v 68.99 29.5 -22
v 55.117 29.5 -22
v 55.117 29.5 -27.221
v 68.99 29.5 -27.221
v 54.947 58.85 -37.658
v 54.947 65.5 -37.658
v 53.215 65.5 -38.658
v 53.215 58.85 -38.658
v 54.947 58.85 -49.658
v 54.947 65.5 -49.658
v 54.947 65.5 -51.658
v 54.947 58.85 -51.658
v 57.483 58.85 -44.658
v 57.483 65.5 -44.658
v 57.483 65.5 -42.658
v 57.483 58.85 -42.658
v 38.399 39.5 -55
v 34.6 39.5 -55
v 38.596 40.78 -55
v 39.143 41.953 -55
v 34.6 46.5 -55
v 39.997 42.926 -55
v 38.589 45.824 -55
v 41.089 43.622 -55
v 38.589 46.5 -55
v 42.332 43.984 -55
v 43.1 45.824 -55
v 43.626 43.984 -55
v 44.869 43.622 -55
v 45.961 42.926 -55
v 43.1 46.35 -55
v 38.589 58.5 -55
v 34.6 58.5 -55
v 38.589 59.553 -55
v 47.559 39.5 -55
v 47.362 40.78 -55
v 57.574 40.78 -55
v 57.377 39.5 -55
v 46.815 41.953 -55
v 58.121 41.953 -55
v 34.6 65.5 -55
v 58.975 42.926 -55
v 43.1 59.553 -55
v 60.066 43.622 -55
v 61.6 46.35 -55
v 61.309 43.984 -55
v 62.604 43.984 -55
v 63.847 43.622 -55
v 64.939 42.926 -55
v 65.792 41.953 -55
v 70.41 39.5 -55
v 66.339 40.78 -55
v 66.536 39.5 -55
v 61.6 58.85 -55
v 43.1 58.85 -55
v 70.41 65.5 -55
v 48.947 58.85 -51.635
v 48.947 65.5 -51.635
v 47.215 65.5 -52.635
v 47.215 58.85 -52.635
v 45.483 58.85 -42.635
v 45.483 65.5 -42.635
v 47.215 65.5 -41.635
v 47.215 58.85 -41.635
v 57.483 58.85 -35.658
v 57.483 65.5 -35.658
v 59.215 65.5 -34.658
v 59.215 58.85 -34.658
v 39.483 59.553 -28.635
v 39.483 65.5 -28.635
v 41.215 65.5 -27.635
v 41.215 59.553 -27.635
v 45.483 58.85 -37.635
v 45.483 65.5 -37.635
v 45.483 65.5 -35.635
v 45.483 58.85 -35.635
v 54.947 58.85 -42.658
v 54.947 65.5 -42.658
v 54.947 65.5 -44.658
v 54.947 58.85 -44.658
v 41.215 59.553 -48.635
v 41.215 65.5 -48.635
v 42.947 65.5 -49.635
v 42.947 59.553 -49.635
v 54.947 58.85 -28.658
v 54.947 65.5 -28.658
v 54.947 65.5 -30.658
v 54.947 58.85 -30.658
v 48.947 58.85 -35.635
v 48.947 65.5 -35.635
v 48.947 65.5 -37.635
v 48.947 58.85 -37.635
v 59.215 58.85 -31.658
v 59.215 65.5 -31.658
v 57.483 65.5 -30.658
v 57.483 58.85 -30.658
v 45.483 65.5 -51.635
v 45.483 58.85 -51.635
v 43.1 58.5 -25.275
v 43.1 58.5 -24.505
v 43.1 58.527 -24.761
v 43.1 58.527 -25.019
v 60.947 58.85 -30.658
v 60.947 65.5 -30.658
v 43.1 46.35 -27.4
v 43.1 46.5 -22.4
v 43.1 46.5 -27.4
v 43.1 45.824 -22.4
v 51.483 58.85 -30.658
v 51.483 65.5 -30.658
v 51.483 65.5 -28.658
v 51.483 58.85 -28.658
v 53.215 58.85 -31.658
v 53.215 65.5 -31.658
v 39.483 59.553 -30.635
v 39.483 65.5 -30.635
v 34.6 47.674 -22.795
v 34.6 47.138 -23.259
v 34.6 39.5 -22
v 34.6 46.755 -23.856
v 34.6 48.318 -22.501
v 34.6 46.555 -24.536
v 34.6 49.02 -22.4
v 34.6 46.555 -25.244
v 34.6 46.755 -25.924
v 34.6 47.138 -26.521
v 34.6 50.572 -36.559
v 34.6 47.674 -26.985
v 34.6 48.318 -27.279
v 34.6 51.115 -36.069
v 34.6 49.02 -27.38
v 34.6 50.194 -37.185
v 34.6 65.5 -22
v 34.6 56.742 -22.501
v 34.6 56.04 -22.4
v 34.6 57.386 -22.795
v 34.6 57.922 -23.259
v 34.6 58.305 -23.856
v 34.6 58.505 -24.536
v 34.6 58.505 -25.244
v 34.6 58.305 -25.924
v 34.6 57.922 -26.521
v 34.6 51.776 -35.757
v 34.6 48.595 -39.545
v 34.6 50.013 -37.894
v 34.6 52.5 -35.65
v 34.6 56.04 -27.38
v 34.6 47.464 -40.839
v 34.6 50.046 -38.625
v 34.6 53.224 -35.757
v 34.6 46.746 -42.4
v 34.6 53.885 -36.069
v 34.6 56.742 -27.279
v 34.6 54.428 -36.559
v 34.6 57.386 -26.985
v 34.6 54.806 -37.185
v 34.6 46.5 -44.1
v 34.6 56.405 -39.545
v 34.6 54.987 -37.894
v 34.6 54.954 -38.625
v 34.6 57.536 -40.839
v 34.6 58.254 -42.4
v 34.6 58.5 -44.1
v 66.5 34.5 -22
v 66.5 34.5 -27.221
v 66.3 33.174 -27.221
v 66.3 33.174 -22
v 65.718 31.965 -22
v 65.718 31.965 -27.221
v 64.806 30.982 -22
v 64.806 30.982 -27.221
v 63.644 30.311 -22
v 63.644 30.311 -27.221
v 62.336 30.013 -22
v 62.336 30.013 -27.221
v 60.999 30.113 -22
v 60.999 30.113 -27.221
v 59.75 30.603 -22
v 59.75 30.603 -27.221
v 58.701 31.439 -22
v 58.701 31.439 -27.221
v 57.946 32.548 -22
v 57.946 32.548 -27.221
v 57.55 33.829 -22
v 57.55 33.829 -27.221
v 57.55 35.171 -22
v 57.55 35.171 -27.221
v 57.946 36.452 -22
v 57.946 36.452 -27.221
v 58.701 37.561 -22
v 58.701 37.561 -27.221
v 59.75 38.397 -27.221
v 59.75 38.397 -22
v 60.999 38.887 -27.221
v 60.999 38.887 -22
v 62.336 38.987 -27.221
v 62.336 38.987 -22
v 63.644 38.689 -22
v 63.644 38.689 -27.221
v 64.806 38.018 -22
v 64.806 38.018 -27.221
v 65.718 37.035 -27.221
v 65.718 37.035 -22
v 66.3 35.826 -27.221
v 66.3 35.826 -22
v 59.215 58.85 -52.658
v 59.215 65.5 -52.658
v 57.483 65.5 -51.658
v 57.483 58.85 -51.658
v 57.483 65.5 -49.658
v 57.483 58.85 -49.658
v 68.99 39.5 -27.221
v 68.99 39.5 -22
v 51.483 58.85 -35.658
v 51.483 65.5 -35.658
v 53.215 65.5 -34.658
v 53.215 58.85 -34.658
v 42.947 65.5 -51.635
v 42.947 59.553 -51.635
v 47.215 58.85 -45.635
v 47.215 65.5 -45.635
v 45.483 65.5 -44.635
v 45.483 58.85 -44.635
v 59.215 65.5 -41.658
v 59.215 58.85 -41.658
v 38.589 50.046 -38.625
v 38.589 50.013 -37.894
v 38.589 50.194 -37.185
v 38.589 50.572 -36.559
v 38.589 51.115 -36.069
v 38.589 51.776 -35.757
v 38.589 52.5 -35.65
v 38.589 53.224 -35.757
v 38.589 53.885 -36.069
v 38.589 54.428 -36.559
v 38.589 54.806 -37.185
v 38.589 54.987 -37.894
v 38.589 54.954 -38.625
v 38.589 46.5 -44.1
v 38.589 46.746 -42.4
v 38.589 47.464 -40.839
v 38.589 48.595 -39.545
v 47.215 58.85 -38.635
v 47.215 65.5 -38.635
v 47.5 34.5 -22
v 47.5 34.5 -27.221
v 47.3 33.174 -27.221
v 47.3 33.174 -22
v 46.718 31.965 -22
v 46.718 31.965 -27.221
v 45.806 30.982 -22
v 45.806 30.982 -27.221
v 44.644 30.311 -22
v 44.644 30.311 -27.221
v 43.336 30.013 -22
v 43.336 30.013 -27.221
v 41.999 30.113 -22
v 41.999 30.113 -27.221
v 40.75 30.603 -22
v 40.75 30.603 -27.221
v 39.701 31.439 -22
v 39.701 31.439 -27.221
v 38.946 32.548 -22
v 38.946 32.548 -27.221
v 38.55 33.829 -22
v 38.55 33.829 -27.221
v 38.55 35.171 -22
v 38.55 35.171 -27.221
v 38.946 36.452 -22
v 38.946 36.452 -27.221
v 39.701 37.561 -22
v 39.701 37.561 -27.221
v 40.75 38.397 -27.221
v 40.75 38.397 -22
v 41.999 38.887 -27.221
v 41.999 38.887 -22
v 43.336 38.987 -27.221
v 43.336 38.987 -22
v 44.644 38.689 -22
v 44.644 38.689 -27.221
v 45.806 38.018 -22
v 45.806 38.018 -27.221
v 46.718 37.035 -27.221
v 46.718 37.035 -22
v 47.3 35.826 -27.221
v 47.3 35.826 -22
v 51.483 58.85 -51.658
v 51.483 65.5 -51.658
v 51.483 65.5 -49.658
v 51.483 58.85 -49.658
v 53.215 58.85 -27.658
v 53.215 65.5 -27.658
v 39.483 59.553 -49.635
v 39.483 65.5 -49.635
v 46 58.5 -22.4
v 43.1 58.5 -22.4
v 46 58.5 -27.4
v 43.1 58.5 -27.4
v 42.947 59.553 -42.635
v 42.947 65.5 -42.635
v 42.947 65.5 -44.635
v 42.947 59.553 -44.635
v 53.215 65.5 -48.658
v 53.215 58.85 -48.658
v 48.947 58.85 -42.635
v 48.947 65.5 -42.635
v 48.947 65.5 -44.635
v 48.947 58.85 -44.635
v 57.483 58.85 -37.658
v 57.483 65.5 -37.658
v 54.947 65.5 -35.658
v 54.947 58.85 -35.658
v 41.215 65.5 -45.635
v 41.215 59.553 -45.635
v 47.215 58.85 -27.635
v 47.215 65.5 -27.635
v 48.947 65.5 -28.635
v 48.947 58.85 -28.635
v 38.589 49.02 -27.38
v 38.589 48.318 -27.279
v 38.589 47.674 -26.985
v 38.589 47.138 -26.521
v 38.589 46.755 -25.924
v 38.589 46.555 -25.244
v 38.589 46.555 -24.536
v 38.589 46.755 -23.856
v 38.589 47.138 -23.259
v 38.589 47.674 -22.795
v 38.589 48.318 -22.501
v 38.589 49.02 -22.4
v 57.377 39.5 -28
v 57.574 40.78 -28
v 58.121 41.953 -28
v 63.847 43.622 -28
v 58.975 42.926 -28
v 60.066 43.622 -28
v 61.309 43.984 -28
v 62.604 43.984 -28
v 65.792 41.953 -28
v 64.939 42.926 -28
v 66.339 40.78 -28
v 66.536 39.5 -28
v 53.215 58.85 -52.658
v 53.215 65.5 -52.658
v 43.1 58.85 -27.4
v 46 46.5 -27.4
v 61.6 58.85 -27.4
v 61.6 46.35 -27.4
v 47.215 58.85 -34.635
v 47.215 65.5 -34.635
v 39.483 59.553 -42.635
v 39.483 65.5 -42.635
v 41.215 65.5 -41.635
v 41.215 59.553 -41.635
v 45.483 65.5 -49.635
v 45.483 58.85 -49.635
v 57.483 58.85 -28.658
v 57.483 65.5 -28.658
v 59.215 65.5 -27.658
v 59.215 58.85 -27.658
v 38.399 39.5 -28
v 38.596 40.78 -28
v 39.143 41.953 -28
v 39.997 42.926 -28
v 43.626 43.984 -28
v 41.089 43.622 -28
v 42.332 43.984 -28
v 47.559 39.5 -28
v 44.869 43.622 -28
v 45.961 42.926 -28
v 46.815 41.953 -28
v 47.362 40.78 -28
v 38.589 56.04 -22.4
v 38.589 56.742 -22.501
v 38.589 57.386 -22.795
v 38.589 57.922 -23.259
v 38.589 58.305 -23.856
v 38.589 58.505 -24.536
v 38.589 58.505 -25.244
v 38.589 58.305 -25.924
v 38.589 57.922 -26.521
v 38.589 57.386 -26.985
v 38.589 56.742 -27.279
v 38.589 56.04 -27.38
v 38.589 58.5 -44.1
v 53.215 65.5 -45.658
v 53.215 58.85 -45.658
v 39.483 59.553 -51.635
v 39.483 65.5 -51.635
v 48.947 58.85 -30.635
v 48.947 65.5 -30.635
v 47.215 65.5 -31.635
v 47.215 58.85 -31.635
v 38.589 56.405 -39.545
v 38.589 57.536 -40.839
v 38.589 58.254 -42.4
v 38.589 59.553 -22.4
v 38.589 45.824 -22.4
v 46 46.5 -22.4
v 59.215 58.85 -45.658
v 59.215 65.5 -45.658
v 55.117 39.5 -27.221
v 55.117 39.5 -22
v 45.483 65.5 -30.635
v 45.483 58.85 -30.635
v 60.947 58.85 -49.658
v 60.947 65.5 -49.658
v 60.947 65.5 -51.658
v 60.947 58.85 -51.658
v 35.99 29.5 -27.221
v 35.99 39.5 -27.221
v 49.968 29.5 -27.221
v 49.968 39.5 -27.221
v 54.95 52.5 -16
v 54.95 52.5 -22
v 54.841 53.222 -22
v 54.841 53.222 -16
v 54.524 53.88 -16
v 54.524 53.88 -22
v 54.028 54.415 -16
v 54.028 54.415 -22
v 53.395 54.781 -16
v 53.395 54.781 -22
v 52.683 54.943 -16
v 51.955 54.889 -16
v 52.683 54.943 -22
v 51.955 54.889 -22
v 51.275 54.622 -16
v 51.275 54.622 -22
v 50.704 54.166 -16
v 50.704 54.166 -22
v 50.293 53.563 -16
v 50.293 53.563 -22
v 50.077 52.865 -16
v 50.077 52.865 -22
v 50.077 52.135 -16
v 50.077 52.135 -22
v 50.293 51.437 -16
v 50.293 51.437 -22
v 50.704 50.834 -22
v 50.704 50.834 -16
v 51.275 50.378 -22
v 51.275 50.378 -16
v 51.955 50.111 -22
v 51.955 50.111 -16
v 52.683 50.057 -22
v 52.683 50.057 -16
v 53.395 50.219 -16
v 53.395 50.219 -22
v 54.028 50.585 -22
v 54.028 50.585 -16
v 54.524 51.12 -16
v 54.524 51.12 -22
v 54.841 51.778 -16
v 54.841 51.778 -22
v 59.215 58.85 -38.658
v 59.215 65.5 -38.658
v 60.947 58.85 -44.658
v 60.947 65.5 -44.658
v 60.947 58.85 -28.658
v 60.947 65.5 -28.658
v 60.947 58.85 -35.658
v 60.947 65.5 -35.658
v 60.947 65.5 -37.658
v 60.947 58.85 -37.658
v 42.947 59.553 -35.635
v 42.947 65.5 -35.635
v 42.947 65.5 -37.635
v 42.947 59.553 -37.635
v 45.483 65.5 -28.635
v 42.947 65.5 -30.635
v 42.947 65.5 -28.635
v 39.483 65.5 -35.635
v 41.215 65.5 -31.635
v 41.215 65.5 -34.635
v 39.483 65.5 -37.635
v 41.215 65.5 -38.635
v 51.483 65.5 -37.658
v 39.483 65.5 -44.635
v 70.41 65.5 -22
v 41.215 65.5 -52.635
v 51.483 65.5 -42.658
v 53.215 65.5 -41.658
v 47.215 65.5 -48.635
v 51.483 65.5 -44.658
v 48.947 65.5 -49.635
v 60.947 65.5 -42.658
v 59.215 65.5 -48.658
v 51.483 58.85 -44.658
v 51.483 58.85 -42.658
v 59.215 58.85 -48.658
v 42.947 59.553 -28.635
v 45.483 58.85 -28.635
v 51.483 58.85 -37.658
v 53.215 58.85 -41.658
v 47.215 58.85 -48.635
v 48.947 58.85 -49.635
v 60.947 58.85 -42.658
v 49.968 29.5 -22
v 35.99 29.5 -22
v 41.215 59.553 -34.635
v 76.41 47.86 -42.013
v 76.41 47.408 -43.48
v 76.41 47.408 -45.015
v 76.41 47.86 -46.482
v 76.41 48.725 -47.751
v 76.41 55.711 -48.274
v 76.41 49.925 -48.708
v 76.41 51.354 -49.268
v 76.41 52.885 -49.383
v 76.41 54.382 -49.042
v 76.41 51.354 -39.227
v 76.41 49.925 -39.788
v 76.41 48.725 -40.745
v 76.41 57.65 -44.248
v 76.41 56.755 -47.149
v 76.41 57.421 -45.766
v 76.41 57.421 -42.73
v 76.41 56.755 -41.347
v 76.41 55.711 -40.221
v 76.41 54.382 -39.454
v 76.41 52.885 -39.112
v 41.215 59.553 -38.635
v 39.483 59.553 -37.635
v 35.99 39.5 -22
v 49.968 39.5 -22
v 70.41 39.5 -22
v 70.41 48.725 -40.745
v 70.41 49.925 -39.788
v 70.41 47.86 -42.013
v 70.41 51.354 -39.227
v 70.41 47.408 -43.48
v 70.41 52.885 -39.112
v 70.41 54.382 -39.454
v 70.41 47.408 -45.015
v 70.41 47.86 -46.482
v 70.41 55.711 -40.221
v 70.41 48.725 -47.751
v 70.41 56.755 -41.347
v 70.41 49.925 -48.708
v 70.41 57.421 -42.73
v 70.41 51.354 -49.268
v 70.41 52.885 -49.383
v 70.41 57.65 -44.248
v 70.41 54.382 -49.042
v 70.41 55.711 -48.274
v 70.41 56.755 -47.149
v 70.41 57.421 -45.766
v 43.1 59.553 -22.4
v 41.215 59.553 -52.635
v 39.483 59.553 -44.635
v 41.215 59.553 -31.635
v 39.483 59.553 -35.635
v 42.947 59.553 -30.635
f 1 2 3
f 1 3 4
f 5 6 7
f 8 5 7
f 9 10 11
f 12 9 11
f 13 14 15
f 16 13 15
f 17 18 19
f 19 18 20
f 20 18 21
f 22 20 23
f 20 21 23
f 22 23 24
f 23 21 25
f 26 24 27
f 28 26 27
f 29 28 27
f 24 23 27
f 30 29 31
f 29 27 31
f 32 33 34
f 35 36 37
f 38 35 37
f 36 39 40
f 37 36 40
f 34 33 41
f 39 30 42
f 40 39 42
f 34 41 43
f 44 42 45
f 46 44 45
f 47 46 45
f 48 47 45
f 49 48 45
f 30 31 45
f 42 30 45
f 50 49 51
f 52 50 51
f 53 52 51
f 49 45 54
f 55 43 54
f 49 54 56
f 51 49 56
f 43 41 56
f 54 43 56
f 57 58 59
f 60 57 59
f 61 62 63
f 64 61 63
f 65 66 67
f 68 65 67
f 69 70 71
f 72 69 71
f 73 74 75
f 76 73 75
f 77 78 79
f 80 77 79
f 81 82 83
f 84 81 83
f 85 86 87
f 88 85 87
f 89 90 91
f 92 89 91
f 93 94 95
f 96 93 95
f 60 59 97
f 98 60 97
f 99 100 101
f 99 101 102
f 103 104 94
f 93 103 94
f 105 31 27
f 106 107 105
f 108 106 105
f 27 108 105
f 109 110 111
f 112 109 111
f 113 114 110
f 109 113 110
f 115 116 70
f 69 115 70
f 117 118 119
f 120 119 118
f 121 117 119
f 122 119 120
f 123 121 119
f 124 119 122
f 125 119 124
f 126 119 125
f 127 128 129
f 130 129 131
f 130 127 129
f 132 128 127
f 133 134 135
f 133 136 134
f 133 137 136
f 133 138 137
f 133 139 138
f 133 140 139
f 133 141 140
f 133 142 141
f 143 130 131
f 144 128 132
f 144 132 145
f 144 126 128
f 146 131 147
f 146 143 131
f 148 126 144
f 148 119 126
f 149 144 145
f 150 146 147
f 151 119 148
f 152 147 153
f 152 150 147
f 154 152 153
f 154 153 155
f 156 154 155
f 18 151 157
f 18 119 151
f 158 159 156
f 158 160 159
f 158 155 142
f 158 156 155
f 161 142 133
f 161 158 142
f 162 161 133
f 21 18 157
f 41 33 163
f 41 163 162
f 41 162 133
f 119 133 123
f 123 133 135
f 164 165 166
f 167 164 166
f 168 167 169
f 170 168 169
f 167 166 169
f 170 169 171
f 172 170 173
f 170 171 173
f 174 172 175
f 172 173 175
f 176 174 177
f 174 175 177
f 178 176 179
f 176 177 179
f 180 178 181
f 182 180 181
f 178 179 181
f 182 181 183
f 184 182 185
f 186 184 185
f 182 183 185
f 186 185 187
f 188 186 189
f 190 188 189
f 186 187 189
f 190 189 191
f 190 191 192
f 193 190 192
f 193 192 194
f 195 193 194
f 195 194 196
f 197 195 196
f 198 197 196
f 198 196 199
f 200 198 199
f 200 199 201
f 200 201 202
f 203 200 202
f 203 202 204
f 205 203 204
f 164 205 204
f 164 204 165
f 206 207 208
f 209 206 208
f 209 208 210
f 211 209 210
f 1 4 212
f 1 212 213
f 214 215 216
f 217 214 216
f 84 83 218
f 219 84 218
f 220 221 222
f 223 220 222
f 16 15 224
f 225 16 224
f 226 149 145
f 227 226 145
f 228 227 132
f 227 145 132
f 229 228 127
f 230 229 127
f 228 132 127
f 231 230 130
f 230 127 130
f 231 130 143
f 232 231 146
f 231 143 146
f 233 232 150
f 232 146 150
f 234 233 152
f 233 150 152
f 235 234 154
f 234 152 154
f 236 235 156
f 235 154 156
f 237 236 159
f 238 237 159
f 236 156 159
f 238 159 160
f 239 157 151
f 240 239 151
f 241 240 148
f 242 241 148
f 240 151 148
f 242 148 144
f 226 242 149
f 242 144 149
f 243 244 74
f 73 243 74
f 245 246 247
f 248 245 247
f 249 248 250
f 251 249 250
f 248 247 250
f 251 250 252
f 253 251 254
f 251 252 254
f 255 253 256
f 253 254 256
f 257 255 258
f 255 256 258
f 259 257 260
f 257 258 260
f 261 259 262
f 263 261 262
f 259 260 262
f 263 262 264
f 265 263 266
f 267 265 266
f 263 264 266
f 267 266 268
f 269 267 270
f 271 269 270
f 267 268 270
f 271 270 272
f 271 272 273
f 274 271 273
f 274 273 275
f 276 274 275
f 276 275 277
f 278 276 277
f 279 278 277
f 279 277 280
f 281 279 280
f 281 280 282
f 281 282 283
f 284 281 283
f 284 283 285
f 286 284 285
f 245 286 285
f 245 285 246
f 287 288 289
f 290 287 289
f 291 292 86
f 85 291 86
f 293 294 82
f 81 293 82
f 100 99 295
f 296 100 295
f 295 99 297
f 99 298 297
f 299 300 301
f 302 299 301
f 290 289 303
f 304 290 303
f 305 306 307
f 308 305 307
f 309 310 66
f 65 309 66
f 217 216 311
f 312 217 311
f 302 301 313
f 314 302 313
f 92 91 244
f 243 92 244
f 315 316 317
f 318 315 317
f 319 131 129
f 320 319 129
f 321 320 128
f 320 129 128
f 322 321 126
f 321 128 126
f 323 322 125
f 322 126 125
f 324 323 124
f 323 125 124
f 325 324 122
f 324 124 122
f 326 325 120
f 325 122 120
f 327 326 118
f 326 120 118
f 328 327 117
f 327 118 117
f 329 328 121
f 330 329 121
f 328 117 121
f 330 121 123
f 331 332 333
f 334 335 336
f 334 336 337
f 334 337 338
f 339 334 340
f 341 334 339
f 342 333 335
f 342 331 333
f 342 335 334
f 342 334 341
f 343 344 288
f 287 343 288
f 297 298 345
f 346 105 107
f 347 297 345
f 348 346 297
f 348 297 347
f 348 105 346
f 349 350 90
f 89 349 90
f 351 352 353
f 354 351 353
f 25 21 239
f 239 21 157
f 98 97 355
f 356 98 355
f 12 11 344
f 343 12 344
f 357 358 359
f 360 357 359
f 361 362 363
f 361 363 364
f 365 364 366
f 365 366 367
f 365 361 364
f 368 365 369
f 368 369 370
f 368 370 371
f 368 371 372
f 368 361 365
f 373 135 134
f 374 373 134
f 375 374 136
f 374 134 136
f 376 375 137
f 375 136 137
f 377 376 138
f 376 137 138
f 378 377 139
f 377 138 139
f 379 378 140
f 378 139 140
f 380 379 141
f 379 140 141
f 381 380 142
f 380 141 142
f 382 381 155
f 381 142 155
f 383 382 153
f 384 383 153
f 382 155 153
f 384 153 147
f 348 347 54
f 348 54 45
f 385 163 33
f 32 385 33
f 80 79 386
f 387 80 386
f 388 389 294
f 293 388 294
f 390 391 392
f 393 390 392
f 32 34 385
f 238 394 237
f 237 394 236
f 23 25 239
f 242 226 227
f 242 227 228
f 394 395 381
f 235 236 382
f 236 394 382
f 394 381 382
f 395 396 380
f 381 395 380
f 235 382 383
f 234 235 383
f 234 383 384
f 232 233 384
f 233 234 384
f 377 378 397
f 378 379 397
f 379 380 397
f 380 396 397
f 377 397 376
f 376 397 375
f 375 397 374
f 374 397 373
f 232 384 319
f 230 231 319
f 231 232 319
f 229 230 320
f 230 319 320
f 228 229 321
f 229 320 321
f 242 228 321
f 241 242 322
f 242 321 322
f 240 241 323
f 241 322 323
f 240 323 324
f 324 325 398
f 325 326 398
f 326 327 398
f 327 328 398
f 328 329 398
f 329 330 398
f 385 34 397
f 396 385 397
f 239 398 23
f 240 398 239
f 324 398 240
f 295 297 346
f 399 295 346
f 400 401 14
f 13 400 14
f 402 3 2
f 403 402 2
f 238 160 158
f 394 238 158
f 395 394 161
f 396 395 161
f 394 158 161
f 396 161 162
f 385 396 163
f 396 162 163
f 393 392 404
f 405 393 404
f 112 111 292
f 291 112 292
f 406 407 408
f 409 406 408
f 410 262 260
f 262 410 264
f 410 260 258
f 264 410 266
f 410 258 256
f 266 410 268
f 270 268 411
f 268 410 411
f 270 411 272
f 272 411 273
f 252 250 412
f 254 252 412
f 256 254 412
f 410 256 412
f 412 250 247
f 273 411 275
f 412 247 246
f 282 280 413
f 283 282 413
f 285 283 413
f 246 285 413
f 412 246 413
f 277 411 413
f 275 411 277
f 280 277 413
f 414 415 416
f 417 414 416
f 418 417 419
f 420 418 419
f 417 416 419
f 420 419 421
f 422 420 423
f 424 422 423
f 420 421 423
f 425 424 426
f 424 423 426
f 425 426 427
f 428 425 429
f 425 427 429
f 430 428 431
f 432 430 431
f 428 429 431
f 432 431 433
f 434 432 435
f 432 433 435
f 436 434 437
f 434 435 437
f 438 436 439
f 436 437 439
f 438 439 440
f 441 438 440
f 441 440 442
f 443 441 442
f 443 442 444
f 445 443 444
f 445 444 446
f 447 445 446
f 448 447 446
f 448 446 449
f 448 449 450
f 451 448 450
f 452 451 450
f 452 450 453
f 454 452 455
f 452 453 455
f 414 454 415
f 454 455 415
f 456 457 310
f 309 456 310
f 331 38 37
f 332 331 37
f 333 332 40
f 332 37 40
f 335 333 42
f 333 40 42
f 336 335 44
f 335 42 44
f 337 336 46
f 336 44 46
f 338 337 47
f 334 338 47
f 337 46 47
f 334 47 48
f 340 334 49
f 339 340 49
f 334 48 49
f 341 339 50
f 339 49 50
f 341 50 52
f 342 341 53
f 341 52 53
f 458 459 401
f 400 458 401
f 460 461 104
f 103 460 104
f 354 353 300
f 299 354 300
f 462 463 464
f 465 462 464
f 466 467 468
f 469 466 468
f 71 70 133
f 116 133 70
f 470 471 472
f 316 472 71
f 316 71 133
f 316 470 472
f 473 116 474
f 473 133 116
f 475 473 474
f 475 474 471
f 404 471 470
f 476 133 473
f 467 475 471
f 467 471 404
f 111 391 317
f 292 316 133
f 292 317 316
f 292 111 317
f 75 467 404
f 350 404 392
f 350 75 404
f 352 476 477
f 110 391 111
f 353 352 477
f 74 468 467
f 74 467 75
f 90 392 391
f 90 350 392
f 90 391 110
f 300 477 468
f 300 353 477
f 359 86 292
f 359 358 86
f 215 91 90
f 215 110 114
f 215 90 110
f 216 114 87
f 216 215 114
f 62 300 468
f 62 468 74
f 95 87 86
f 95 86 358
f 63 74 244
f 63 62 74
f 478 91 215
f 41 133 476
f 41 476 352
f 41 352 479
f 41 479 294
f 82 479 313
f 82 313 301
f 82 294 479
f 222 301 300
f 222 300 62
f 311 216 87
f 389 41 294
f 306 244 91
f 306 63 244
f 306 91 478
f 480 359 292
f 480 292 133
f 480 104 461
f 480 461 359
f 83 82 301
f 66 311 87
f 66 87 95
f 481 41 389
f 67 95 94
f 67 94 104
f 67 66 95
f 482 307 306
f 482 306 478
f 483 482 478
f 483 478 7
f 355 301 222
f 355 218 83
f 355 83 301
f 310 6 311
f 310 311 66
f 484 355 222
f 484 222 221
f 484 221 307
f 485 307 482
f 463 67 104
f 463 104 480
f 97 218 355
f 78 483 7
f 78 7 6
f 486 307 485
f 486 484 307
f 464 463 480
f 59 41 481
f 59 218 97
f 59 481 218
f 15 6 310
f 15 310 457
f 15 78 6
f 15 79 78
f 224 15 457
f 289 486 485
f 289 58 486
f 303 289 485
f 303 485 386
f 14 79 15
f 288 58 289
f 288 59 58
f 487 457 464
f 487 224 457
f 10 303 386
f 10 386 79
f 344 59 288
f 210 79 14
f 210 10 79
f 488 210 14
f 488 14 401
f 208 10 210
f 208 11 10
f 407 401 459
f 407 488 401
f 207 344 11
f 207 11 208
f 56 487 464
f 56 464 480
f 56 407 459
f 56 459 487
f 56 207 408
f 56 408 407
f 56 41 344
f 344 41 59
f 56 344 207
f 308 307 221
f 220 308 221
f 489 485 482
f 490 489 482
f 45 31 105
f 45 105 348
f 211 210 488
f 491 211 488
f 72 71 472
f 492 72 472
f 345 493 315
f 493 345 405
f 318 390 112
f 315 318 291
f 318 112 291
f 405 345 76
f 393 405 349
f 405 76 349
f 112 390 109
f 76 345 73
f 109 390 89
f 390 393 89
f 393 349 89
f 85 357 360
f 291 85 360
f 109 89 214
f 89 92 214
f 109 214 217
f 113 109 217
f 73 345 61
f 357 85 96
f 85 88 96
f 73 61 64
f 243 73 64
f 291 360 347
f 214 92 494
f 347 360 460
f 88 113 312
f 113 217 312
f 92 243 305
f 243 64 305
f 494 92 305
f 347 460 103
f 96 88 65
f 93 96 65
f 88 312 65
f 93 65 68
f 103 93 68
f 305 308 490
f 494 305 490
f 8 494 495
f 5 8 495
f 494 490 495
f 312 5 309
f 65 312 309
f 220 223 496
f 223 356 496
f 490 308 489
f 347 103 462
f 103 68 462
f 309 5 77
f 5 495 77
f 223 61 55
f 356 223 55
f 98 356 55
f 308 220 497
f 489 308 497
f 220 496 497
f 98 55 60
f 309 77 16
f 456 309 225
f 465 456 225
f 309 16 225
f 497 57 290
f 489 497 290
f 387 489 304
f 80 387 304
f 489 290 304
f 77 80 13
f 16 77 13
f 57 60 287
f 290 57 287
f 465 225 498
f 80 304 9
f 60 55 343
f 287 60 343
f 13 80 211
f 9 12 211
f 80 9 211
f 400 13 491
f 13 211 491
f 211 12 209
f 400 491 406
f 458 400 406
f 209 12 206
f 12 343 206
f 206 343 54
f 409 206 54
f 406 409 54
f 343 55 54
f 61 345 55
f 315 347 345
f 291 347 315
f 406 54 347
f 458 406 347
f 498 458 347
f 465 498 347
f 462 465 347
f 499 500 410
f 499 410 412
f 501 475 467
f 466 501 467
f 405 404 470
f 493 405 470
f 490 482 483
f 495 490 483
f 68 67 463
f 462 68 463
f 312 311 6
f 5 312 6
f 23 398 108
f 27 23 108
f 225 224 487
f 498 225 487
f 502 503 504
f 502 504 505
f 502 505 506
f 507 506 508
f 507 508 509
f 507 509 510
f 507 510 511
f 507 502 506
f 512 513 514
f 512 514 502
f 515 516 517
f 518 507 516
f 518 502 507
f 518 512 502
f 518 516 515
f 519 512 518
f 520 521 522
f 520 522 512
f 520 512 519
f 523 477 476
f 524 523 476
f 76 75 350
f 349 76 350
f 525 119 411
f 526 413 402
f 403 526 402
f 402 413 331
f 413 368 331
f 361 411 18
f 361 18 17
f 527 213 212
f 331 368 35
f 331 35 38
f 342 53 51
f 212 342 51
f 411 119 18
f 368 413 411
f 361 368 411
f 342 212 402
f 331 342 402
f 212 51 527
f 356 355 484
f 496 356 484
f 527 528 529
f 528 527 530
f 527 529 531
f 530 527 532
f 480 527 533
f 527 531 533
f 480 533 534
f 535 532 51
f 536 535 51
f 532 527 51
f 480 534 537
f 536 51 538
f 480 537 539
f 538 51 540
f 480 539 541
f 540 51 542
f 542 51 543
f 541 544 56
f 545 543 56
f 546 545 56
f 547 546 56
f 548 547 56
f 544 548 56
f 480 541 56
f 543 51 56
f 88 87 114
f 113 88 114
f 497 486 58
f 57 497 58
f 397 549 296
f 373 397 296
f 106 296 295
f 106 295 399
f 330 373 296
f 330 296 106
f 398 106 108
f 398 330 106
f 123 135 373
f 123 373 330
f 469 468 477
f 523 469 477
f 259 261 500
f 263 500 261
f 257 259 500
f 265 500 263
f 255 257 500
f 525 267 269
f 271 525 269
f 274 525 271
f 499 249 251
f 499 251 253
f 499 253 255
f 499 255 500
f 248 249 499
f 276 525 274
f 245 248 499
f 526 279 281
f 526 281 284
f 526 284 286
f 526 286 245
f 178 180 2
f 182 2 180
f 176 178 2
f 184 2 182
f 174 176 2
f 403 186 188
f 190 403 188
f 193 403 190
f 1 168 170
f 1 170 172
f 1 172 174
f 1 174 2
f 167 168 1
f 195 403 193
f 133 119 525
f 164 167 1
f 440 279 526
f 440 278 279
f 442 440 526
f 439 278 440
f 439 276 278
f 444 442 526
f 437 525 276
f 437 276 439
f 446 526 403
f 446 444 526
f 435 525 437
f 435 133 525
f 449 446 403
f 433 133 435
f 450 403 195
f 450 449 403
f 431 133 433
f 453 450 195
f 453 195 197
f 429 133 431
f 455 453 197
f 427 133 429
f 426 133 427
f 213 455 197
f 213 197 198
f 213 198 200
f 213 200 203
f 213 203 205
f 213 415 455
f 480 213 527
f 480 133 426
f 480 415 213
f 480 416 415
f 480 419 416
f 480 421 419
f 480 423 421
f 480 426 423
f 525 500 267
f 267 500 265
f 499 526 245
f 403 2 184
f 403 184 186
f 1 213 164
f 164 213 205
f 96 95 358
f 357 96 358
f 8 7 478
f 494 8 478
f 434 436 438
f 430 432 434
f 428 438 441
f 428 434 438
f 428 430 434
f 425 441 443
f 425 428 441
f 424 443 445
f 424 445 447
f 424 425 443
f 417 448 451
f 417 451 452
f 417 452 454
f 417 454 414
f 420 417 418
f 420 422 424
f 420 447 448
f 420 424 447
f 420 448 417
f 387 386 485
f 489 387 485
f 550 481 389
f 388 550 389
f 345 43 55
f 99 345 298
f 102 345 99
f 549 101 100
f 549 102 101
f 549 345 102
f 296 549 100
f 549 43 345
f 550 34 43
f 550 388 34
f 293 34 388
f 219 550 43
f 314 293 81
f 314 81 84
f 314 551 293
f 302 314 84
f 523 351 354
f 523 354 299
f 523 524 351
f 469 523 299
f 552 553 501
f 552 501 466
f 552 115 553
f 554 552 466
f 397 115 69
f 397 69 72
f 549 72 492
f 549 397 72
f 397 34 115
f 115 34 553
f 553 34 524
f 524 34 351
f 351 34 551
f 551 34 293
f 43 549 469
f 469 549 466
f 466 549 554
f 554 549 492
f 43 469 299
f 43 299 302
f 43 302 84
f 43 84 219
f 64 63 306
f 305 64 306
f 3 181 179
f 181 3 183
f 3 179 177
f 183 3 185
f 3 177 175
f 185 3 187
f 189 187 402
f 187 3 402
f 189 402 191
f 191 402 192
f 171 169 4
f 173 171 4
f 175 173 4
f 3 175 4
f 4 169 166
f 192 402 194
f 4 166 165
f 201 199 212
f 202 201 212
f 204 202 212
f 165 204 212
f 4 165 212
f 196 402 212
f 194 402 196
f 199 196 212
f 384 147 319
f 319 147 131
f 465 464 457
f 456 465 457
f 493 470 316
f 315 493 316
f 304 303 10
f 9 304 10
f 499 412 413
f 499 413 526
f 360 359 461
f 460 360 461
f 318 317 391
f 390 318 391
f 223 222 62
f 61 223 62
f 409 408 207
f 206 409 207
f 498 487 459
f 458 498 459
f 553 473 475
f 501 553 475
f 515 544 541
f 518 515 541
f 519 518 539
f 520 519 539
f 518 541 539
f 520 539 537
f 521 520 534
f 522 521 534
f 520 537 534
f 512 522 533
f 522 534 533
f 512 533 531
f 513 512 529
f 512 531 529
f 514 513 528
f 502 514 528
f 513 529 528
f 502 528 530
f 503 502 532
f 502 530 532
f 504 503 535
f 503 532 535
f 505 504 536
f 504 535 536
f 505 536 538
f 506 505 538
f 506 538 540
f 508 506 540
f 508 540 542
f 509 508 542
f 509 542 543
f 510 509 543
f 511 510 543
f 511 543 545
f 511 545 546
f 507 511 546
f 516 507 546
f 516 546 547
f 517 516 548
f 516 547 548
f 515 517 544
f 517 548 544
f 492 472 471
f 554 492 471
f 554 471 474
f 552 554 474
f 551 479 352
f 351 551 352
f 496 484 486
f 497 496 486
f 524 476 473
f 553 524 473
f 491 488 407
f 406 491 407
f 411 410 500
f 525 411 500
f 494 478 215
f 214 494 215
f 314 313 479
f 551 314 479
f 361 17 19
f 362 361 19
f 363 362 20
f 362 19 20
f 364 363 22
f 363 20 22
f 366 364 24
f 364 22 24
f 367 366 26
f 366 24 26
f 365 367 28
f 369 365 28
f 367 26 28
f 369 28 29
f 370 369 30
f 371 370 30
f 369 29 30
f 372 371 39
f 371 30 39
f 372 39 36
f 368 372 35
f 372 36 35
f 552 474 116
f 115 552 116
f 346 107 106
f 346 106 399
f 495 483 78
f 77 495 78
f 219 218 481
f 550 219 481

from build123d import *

# Parameters (mm, degrees)
SKETCH007_W          = 35.81
SKETCH007_H          = 26
PAD002_DEPTH         = 33
SKETCH008_R          = 2.45
PAD003_DEPTH         = 6
SKETCH009_W          = 13.978334
SKETCH009_H          = 5.221016
SKETCH009_W_2        = 13.87282
PAD004_DEPTH         = 10
SKETCH010_R          = 4.5
POCKET_DEPTH         = 11.222016
SKETCH016_W          = 22.6
SKETCH016_H          = 12.5
POCKET004_DEPTH      = 27.6
POCKET005_DEPTH      = 5.4
SKETCH018_W          = 4.8
SKETCH018_H          = 12
POCKET006_DEPTH      = 5
POCKET007_DEPTH      = 8.5
POCKET008_DEPTH      = 200
POCKET008_DEPTH_BACK = 200
POCKET036_DEPTH      = 5
SKETCH099_R          = 5.15
PAD045_DEPTH         = 6
SKETCH100_W          = 4.510635
SKETCH100_H          = 13.729386
POCKET046_DEPTH      = 34
POCKET047_DEPTH      = 9
POCKET048_DEPTH      = 27


with BuildPart() as part:
    # Sketch007 → Pad002 (new body)
    with BuildSketch(Plane.XY):
        with Locations((52.505, 52.5)):
            Rectangle(SKETCH007_W, SKETCH007_H)
    extrude(amount=PAD002_DEPTH)

    # Sketch008 (on Face6 of Pad002) → Pad003 (join)
    with BuildSketch(Plane.XY.offset(33)):
        with Locations((52.5, 52.5)):
            Circle(SKETCH008_R)
    extrude(amount=PAD003_DEPTH)

    # Sketch009 (on Face1 of Pad003) → Pad004 (join)
    with BuildSketch(Plane.XZ.offset(-39.5)):
        with Locations((42.979167, 30.389492)):
            Rectangle(SKETCH009_W, SKETCH009_H)
        with Locations((62.05359, 30.389492)):
            Rectangle(SKETCH009_W_2, SKETCH009_H)
    extrude(amount=PAD004_DEPTH)

    # Sketch010 (on Face6 of Pad004) → Pocket (cut, through all)
    with BuildSketch(Plane(origin=(0, 0, 27.778984), x_dir=(1, 0, 0), z_dir=(0, 0, -1))):
        with Locations((62, -34.5)):
            Circle(SKETCH010_R)
        with Locations((43, -34.5)):
            Circle(SKETCH010_R)
    extrude(amount=-POCKET_DEPTH, mode=Mode.SUBTRACT)

    # Sketch016 → Pocket004 (cut)
    with BuildSketch(Plane(origin=(0, 0, 0), x_dir=(1, 0, 0), z_dir=(0, 0, -1))):
        with Locations((50.3, -52.6)):
            Rectangle(SKETCH016_W, SKETCH016_H)
    extrude(amount=-POCKET004_DEPTH, mode=Mode.SUBTRACT)

    # Sketch015 (on Face3 of Pocket) → Pocket005 (cut)
    with BuildSketch(Plane(origin=(34.6, 0, 0), x_dir=(0, -1, 0), z_dir=(-1, 0, 0))):
        with BuildLine():
            Line((-58.5, 0), (-46.5, 0))
            Line((-46.5, 0), (-46.5, 10.9))
            ThreePointArc((-46.5, 10.9), (-47.4637930268, 14.1613830383), (-50.0455397742, 16.375))
            ThreePointArc((-50.0455397742, 16.375), (-52.5, 19.35), (-54.9544602258, 16.375))
            ThreePointArc((-54.9544602258, 16.375), (-57.5362069732, 14.1613830383), (-58.5, 10.9))
            Line((-58.5, 10.9), (-58.5, 0))
        make_face()
    extrude(amount=-POCKET005_DEPTH, mode=Mode.SUBTRACT)

    # Sketch018 → Pocket006 (cut)
    with BuildSketch(Plane(origin=(0, 0, 27.6), x_dir=(1, 0, 0), z_dir=(0, 0, -1))):
        with Locations((43.6, -52.5)):
            Rectangle(SKETCH018_W, SKETCH018_H)
    extrude(amount=-POCKET006_DEPTH, mode=Mode.SUBTRACT)

    # Sketch020 (on Face3 of Pocket006) → Pocket007 (cut)
    with BuildSketch(Plane(origin=(34.6, 0, 0), x_dir=(0, -1, 0), z_dir=(-1, 0, 0))):
        with BuildLine():
            ThreePointArc((-56.04, 32.6), (-58.53, 30.11), (-56.04, 27.62))
            Line((-56.04, 27.62), (-49.02, 27.62))
            ThreePointArc((-49.02, 27.62), (-46.53, 30.11), (-49.02, 32.6))
            Line((-56.04, 32.6), (-49.02, 32.6))
        make_face()
    extrude(amount=-POCKET007_DEPTH, mode=Mode.SUBTRACT)

    # Sketch021 (on Face9 of Pocket007) → Pocket008 (cut, two sides)
    with BuildSketch(Plane(origin=(0, 0, 27.778984), x_dir=(1, 0, 0), z_dir=(0, 0, -1))) as pocket008_sk:
        Polygon((-57.6610266203, 24.8205080757), (-59.6610266203, 25.9752086141), (-61.6610266203, 24.8205080757), (-61.6610266203, 22.5111069989), (-59.6610266203, 21.3564064606), (-57.6610266203, 22.5111069989), align=None)
        Polygon((-57.6610266203, 18.2017059222), (-59.6610266203, 19.3564064606), (-61.6610266203, 18.2017059222), (-61.6610266203, 15.8923048454), (-59.6610266203, 14.737604307), (-57.6610266203, 15.8923048454), align=None)
        Polygon((-57.6610266203, 11.5829037687), (-59.6610266203, 12.737604307), (-61.6610266203, 11.5829037687), (-61.6610266203, 9.2735026919), (-59.6610266203, 8.1188021535), (-57.6610266203, 9.2735026919), align=None)
        Polygon((-57.6610266203, 4.9641016151), (-59.6610266203, 6.1188021535), (-61.6610266203, 4.9641016151), (-61.6610266203, 2.6547005384), (-59.6610266203, 1.5), (-57.6610266203, 2.6547005384), align=None)
        Polygon((-45.6610266203, 24.8205080757), (-47.6610266203, 25.9752086141), (-49.6610266203, 24.8205080757), (-49.6610266203, 22.5111069989), (-47.6610266203, 21.3564064606), (-45.6610266203, 22.5111069989), align=None)
        Polygon((-45.6610266203, 18.2017059222), (-47.6610266203, 19.3564064606), (-49.6610266203, 18.2017059222), (-49.6610266203, 15.8923048454), (-47.6610266203, 14.737604307), (-45.6610266203, 15.8923048454), align=None)
        Polygon((-45.6610266203, 11.5829037687), (-47.6610266203, 12.737604307), (-49.6610266203, 11.5829037687), (-49.6610266203, 9.2735026919), (-47.6610266203, 8.1188021535), (-45.6610266203, 9.2735026919), align=None)
        Polygon((-45.6610266203, 4.9641016151), (-47.6610266203, 6.1188021535), (-49.6610266203, 4.9641016151), (-49.6610266203, 2.6547005384), (-47.6610266203, 1.5), (-45.6610266203, 2.6547005384), align=None)
        Polygon((-39.6610266203, 24.8205080757), (-41.6610266203, 25.9752086141), (-43.6610266203, 24.8205080757), (-43.6610266203, 22.5111069989), (-41.6610266203, 21.3564064606), (-39.6610266203, 22.5111069989), align=None)
        Polygon((-39.6610266203, 18.2017059222), (-41.6610266203, 19.3564064606), (-43.6610266203, 18.2017059222), (-43.6610266203, 15.8923048454), (-41.6610266203, 14.737604307), (-39.6610266203, 15.8923048454), align=None)
        Polygon((-39.6610266203, 11.5829037687), (-41.6610266203, 12.737604307), (-43.6610266203, 11.5829037687), (-43.6610266203, 9.2735026919), (-41.6610266203, 8.1188021535), (-39.6610266203, 9.2735026919), align=None)
        Polygon((-39.6610266203, 4.9641016151), (-41.6610266203, 6.1188021535), (-43.6610266203, 4.9641016151), (-43.6610266203, 2.6547005384), (-41.6610266203, 1.5), (-39.6610266203, 2.6547005384), align=None)
        Polygon((-51.6610266203, 24.8205080757), (-53.6610266203, 25.9752086141), (-55.6610266203, 24.8205080757), (-55.6610266203, 22.5111069989), (-53.6610266203, 21.3564064606), (-51.6610266203, 22.5111069989), align=None)
        Polygon((-51.6610266203, 18.2017059222), (-53.6610266203, 19.3564064606), (-55.6610266203, 18.2017059222), (-55.6610266203, 15.8923048454), (-53.6610266203, 14.737604307), (-51.6610266203, 15.8923048454), align=None)
        Polygon((-51.6610266203, 11.5829037687), (-53.6610266203, 12.737604307), (-55.6610266203, 11.5829037687), (-55.6610266203, 9.2735026919), (-53.6610266203, 8.1188021535), (-51.6610266203, 9.2735026919), align=None)
        Polygon((-51.6610266203, 4.9641016151), (-53.6610266203, 6.1188021535), (-55.6610266203, 4.9641016151), (-55.6610266203, 2.6547005384), (-53.6610266203, 1.5), (-51.6610266203, 2.6547005384), align=None)
    extrude(amount=-POCKET008_DEPTH, mode=Mode.SUBTRACT)
    extrude(pocket008_sk.sketch, amount=POCKET008_DEPTH_BACK, mode=Mode.SUBTRACT)

    # CopySketch077 → Pocket036 (cut)
    with BuildSketch(Plane.XZ.offset(10)):
        with BuildLine():
            ThreePointArc((49.5809685833, -52.61365544), (52.5285478813, -63.912849758), (55.405181515, -52.5953856034))
            ThreePointArc((55.405181515, -52.5953856034), (52.4814034168, -48.8837389355), (49.5809685833, -52.61365544))
        make_face()
    extrude(amount=-POCKET036_DEPTH, mode=Mode.SUBTRACT)

    # Sketch099 (on Face11 of Pocket036) → Pad045 (join)
    with BuildSketch(Plane.YZ.offset(70.41)):
        with Locations((52.5, 10.752384)):
            Circle(SKETCH099_R)
    extrude(amount=PAD045_DEPTH)

    # Sketch100 (on Face44 of Pad045) → Pocket046 (cut)
    with BuildSketch(Plane(origin=(0, 0, 32.6), x_dir=(1, 0, 0), z_dir=(0, 0, -1))):
        with Locations((40.8446805, -52.688568)):
            Rectangle(SKETCH100_W, SKETCH100_H)
    extrude(amount=POCKET046_DEPTH, mode=Mode.SUBTRACT)

    # Sketch101 (on Face12 of Pocket046) → Pocket047 (cut)
    with BuildSketch(Plane(origin=(0, 65.5, 0), x_dir=(-1, 0, 0), z_dir=(0, 1, 0))):
        Polygon((-59.214752, 23.341819945), (-57.4827011924, 24.341819945), (-57.4827011924, 26.341819945), (-59.214752, 27.341819945), (-60.9468028076, 26.341819945), (-60.9468028076, 24.341819945), align=None)
        Polygon((-59.214752, 16.341819945), (-57.4827011924, 17.341819945), (-57.4827011924, 19.341819945), (-59.214752, 20.341819945), (-60.9468028076, 19.341819945), (-60.9468028076, 17.341819945), align=None)
        Polygon((-59.214752, 9.341819945), (-57.4827011924, 10.341819945), (-57.4827011924, 12.341819945), (-59.214752, 13.341819945), (-60.9468028076, 12.341819945), (-60.9468028076, 10.341819945), align=None)
        Polygon((-59.214752, 2.341819945), (-57.4827011924, 3.341819945), (-57.4827011924, 5.341819945), (-59.214752, 6.341819945), (-60.9468028076, 5.341819945), (-60.9468028076, 3.341819945), align=None)
        Polygon((-53.214752, 23.341819945), (-51.4827011924, 24.341819945), (-51.4827011924, 26.341819945), (-53.214752, 27.341819945), (-54.9468028076, 26.341819945), (-54.9468028076, 24.341819945), align=None)
        Polygon((-53.214752, 16.341819945), (-51.4827011924, 17.341819945), (-51.4827011924, 19.341819945), (-53.214752, 20.341819945), (-54.9468028076, 19.341819945), (-54.9468028076, 17.341819945), align=None)
        Polygon((-53.214752, 9.341819945), (-51.4827011924, 10.341819945), (-51.4827011924, 12.341819945), (-53.214752, 13.341819945), (-54.9468028076, 12.341819945), (-54.9468028076, 10.341819945), align=None)
        Polygon((-53.214752, 2.341819945), (-51.4827011924, 3.341819945), (-51.4827011924, 5.341819945), (-53.214752, 6.341819945), (-54.9468028076, 5.341819945), (-54.9468028076, 3.341819945), align=None)
        Polygon((-47.214752, 23.364838), (-45.4827011924, 24.364838), (-45.4827011924, 26.364838), (-47.214752, 27.364838), (-48.9468028076, 26.364838), (-48.9468028076, 24.364838), align=None)
        Polygon((-47.214752, 16.364838), (-45.4827011924, 17.364838), (-45.4827011924, 19.364838), (-47.214752, 20.364838), (-48.9468028076, 19.364838), (-48.9468028076, 17.364838), align=None)
        Polygon((-47.214752, 9.364838), (-45.4827011924, 10.364838), (-45.4827011924, 12.364838), (-47.214752, 13.364838), (-48.9468028076, 12.364838), (-48.9468028076, 10.364838), align=None)
        Polygon((-47.214752, 2.364838), (-45.4827011924, 3.364838), (-45.4827011924, 5.364838), (-47.214752, 6.364838), (-48.9468028076, 5.364838), (-48.9468028076, 3.364838), align=None)
        Polygon((-41.214752, 23.364838), (-39.4827011924, 24.364838), (-39.4827011924, 26.364838), (-41.214752, 27.364838), (-42.9468028076, 26.364838), (-42.9468028076, 24.364838), align=None)
        Polygon((-41.214752, 16.364838), (-39.4827011924, 17.364838), (-39.4827011924, 19.364838), (-41.214752, 20.364838), (-42.9468028076, 19.364838), (-42.9468028076, 17.364838), align=None)
        Polygon((-41.214752, 9.364838), (-39.4827011924, 10.364838), (-39.4827011924, 12.364838), (-41.214752, 13.364838), (-42.9468028076, 12.364838), (-42.9468028076, 10.364838), align=None)
        Polygon((-41.214752, 2.364838), (-39.4827011924, 3.364838), (-39.4827011924, 5.364838), (-41.214752, 6.364838), (-42.9468028076, 5.364838), (-42.9468028076, 3.364838), align=None)
    extrude(amount=-POCKET047_DEPTH, mode=Mode.SUBTRACT)

    # Sketch102 (on Face2 of Pocket047) → Pocket048 (cut)
    with BuildSketch(Plane(origin=(0, 0, 0), x_dir=(1, 0, 0), z_dir=(0, 0, -1))):
        with BuildLine():
            ThreePointArc((47.558878, -33.45), (42.978878, -28.87), (38.398878, -33.45))
            Line((38.398878, -33.45), (38.398878, -39.45))
            ThreePointArc((38.398878, -39.45), (42.978878, -44.03), (47.558878, -39.45))
            Line((47.558878, -33.45), (47.558878, -39.45))
        make_face()
        with BuildLine():
            ThreePointArc((66.5366215742, -33.45), (61.9566215742, -28.87), (57.3766215742, -33.45))
            Line((57.3766215742, -33.45), (57.3766215742, -39.45))
            ThreePointArc((57.3766215742, -39.45), (61.9566215742, -44.03), (66.5366215742, -39.45))
            Line((66.5366215742, -33.45), (66.5366215742, -39.45))
        make_face()
    extrude(amount=-POCKET048_DEPTH, mode=Mode.SUBTRACT)


with BuildPart() as part_1:
    # Body002 placement: moved
    add(part.part.moved(Location((0, 0, -55))))


solid = part_1.part
